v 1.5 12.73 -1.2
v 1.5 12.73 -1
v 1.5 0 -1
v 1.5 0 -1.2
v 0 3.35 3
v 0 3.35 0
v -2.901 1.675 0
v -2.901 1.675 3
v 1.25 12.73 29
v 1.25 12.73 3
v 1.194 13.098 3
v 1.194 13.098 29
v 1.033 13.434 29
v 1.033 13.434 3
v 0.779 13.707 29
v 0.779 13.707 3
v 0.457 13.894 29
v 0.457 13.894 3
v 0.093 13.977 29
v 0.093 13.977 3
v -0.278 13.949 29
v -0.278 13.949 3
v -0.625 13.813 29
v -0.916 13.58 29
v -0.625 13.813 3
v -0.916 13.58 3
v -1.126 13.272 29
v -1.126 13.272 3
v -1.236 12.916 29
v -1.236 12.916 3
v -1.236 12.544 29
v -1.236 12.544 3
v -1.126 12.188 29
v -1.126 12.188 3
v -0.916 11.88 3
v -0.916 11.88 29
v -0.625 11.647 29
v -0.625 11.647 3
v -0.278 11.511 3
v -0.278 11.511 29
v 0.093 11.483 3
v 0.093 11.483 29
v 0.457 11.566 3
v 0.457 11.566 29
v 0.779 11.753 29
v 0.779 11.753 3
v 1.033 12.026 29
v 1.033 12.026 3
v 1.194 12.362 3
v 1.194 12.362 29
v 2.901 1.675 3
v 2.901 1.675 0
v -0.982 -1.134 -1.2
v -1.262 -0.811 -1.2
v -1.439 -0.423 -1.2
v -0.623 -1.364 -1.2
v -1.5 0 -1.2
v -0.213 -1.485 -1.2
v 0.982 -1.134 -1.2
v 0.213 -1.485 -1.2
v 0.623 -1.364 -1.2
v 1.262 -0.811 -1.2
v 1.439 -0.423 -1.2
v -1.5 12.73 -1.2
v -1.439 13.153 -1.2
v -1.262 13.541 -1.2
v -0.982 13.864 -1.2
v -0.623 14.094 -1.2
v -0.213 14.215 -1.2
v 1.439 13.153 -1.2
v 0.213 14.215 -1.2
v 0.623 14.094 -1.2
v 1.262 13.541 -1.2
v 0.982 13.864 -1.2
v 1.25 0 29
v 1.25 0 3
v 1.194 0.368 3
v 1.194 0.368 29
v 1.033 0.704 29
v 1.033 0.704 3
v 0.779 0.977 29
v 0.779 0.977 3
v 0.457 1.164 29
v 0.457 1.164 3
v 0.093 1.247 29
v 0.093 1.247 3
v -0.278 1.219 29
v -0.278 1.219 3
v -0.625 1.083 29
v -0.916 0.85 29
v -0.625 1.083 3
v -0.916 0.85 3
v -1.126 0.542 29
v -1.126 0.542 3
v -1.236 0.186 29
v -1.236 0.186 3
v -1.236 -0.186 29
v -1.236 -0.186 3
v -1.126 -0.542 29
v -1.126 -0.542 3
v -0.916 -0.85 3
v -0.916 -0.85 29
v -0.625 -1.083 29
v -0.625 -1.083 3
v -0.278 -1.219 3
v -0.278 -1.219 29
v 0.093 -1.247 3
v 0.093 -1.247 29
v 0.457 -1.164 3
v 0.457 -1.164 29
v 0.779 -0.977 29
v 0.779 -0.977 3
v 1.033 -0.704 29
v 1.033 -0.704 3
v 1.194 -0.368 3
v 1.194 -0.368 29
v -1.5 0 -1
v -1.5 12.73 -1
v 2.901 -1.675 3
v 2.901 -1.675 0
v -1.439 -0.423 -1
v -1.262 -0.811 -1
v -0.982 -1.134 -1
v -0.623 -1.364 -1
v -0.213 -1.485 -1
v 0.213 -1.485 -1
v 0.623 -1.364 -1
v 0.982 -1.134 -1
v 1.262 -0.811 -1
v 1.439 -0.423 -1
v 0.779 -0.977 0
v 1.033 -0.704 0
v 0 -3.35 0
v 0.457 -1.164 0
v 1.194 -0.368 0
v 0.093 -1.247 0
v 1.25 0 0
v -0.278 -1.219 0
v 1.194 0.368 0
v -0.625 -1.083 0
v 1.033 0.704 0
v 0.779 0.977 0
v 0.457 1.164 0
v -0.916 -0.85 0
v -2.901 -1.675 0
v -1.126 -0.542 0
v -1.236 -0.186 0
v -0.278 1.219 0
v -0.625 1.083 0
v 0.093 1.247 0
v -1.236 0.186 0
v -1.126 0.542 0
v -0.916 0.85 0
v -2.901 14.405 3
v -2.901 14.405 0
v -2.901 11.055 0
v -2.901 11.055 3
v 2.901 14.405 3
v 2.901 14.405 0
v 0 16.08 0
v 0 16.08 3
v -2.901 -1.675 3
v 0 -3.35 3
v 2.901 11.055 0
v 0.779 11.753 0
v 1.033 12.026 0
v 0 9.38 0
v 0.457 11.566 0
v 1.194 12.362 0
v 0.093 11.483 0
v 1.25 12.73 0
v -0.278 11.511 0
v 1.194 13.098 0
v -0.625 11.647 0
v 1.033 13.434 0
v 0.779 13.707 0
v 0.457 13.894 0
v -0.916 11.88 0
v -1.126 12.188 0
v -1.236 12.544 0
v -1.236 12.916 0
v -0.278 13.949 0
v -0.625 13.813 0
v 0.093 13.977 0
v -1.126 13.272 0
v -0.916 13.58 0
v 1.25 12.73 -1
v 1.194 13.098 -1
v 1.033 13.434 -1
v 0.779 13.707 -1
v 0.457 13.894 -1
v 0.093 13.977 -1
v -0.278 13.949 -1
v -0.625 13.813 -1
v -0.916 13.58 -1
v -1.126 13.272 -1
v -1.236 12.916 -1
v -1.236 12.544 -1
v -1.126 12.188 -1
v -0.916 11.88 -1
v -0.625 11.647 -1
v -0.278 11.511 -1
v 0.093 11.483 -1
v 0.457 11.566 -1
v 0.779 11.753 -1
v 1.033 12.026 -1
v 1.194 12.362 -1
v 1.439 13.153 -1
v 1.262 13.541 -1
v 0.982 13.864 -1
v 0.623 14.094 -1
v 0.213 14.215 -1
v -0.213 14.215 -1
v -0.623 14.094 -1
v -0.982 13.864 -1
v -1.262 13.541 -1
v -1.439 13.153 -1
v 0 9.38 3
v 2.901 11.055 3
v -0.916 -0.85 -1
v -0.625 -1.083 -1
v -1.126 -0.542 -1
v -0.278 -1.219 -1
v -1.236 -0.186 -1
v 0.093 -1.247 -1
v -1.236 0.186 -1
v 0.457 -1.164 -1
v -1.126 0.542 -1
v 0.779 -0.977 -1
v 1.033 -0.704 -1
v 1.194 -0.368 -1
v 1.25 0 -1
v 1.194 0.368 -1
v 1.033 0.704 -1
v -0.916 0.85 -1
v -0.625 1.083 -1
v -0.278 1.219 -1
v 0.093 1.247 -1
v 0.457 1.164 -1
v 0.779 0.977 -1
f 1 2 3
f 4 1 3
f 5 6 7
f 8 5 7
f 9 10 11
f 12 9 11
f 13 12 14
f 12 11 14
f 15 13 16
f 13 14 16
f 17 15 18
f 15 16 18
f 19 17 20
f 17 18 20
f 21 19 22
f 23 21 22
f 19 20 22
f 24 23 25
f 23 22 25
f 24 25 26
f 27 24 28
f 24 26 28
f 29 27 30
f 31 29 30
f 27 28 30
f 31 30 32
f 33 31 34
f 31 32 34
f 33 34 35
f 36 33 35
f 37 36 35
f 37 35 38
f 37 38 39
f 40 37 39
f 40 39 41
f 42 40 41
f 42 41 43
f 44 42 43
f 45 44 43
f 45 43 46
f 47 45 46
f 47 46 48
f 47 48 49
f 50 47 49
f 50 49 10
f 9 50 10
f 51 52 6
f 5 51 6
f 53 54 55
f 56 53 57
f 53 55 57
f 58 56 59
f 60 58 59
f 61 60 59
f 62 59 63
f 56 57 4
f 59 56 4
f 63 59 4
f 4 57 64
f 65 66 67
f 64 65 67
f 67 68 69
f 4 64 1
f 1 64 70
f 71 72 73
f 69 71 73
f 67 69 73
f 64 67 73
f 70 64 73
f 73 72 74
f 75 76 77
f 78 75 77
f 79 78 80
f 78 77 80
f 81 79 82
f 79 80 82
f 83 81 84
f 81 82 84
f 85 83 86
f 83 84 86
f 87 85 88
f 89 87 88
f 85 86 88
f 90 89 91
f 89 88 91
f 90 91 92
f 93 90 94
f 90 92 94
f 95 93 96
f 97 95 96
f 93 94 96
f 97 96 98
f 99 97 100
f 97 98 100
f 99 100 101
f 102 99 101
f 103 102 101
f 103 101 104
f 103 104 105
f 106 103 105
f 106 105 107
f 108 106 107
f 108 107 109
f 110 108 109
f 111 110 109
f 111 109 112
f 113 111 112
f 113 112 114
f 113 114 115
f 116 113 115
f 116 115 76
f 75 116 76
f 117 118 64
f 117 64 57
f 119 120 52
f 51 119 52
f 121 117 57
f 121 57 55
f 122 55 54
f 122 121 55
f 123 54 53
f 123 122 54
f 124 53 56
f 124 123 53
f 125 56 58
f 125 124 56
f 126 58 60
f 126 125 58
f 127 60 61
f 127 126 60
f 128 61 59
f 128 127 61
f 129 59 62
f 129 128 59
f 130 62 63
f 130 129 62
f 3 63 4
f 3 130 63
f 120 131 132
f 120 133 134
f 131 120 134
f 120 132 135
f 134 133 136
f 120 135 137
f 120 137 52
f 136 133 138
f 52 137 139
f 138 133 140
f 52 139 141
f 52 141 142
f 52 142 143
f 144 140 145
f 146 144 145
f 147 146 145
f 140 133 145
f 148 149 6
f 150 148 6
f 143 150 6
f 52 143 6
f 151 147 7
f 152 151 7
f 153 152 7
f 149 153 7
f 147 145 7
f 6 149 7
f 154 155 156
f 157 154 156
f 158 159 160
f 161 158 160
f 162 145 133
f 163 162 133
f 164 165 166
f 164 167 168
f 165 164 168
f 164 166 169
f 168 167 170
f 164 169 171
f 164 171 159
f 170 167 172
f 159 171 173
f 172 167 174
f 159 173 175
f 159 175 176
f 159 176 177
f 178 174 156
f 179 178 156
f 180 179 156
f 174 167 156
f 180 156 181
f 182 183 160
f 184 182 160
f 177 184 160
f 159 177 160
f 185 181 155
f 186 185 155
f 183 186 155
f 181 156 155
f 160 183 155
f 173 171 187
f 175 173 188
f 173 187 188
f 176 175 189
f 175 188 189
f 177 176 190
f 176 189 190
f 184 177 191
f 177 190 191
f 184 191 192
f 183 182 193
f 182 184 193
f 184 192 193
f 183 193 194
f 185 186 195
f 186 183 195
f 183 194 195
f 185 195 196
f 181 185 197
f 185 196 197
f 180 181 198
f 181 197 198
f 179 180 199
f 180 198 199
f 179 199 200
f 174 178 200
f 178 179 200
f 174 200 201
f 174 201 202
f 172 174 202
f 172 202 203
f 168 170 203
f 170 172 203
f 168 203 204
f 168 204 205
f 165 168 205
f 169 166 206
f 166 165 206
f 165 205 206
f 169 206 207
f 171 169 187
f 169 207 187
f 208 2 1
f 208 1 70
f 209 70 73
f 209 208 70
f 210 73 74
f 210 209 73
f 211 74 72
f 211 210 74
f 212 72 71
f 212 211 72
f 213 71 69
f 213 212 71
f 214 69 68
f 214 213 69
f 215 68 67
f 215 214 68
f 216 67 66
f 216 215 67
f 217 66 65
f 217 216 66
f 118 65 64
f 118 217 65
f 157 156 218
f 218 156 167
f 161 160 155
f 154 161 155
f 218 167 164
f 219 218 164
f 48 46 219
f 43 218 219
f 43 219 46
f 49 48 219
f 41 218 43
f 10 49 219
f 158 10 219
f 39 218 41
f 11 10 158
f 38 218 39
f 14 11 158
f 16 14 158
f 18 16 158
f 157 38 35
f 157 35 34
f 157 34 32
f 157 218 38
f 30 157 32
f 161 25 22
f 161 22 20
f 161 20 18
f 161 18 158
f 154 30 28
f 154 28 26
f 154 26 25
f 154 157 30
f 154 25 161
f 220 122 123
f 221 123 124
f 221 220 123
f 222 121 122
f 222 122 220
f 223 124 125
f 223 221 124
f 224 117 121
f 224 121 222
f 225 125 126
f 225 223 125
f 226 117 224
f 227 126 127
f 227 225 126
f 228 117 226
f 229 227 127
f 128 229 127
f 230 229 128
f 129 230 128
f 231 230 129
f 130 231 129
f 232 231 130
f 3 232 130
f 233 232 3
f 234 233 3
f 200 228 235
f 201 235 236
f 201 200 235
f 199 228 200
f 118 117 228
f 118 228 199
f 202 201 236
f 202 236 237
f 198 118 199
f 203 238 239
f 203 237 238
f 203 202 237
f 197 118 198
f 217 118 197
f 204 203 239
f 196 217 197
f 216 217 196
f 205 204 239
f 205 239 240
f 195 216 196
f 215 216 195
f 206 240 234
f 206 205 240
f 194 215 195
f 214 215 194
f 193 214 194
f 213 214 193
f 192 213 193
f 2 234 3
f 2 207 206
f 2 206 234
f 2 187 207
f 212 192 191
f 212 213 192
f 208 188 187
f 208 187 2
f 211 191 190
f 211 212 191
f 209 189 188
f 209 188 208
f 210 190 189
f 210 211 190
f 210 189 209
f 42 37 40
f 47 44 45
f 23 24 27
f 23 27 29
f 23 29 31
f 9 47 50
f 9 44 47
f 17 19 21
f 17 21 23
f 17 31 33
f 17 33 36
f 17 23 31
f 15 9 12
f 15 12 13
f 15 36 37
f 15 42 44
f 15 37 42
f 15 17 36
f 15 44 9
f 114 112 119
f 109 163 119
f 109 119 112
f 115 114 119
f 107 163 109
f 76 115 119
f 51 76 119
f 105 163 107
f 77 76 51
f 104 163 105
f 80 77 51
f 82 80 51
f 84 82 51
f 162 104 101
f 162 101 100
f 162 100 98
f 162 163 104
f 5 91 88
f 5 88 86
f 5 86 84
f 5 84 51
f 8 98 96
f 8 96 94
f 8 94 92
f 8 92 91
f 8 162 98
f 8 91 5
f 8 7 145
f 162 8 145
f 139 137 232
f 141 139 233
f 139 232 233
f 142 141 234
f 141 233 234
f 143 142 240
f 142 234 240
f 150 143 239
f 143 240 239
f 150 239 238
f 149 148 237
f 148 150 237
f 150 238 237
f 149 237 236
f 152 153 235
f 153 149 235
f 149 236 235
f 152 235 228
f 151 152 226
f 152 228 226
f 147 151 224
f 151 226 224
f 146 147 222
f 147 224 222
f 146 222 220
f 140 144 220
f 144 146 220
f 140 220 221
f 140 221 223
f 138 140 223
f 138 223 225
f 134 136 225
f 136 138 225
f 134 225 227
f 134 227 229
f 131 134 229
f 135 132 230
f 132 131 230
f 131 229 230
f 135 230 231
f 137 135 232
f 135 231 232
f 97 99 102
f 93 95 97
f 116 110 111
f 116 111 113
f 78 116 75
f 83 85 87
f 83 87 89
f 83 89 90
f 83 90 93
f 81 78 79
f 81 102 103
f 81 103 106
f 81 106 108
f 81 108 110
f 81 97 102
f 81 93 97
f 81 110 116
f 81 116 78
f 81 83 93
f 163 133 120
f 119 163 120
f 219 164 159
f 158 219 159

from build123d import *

# Parameters (mm, degrees)
PAD004_DEPTH   = 0.2
SKETCH003_R    = 1.25
PAD005_DEPTH   = 30
PRISM_DEPTH    = 3
PRISM001_DEPTH = 3


with BuildPart() as part:
    # Sketch008 → Pad004 (new body)
    with BuildSketch(Plane.XY.offset(-1)):
        with BuildLine():
            ThreePointArc((-1.5, 0), (0, -1.5), (1.5, 0))
            Line((1.5, 12.73), (1.5, 0))
            ThreePointArc((1.5, 12.73), (0, 14.23), (-1.5, 12.73))
            Line((-1.5, 12.73), (-1.5, 0))
        make_face()
    extrude(amount=-PAD004_DEPTH)

    # Sketch003 → Pad005 (join)
    with BuildSketch(Plane.XY.offset(-1)):
        Circle(SKETCH003_R)
        with Locations((0, 12.73)):
            Circle(SKETCH003_R)
    extrude(amount=PAD005_DEPTH)

    # Prism → Prism (join)
    with BuildSketch(Plane(origin=(0, 0, 0), x_dir=(0, 1, 0), z_dir=(0, 0, 1))):
        Polygon((3.35, 0), (1.675, 2.901185), (-1.675, 2.901185), (-3.35, 0), (-1.675, -2.901185), (1.675, -2.901185), align=None)
    extrude(amount=PRISM_DEPTH)

    # Prism001 → Prism001 (join)
    with BuildSketch(Plane(origin=(0, 12.73, 0), x_dir=(0, 1, 0), z_dir=(0, 0, 1))):
        Polygon((3.35, 0), (1.675, 2.901185), (-1.675, 2.901185), (-3.35, 0), (-1.675, -2.901185), (1.675, -2.901185), align=None)
    extrude(amount=PRISM001_DEPTH)


solid = part.part
